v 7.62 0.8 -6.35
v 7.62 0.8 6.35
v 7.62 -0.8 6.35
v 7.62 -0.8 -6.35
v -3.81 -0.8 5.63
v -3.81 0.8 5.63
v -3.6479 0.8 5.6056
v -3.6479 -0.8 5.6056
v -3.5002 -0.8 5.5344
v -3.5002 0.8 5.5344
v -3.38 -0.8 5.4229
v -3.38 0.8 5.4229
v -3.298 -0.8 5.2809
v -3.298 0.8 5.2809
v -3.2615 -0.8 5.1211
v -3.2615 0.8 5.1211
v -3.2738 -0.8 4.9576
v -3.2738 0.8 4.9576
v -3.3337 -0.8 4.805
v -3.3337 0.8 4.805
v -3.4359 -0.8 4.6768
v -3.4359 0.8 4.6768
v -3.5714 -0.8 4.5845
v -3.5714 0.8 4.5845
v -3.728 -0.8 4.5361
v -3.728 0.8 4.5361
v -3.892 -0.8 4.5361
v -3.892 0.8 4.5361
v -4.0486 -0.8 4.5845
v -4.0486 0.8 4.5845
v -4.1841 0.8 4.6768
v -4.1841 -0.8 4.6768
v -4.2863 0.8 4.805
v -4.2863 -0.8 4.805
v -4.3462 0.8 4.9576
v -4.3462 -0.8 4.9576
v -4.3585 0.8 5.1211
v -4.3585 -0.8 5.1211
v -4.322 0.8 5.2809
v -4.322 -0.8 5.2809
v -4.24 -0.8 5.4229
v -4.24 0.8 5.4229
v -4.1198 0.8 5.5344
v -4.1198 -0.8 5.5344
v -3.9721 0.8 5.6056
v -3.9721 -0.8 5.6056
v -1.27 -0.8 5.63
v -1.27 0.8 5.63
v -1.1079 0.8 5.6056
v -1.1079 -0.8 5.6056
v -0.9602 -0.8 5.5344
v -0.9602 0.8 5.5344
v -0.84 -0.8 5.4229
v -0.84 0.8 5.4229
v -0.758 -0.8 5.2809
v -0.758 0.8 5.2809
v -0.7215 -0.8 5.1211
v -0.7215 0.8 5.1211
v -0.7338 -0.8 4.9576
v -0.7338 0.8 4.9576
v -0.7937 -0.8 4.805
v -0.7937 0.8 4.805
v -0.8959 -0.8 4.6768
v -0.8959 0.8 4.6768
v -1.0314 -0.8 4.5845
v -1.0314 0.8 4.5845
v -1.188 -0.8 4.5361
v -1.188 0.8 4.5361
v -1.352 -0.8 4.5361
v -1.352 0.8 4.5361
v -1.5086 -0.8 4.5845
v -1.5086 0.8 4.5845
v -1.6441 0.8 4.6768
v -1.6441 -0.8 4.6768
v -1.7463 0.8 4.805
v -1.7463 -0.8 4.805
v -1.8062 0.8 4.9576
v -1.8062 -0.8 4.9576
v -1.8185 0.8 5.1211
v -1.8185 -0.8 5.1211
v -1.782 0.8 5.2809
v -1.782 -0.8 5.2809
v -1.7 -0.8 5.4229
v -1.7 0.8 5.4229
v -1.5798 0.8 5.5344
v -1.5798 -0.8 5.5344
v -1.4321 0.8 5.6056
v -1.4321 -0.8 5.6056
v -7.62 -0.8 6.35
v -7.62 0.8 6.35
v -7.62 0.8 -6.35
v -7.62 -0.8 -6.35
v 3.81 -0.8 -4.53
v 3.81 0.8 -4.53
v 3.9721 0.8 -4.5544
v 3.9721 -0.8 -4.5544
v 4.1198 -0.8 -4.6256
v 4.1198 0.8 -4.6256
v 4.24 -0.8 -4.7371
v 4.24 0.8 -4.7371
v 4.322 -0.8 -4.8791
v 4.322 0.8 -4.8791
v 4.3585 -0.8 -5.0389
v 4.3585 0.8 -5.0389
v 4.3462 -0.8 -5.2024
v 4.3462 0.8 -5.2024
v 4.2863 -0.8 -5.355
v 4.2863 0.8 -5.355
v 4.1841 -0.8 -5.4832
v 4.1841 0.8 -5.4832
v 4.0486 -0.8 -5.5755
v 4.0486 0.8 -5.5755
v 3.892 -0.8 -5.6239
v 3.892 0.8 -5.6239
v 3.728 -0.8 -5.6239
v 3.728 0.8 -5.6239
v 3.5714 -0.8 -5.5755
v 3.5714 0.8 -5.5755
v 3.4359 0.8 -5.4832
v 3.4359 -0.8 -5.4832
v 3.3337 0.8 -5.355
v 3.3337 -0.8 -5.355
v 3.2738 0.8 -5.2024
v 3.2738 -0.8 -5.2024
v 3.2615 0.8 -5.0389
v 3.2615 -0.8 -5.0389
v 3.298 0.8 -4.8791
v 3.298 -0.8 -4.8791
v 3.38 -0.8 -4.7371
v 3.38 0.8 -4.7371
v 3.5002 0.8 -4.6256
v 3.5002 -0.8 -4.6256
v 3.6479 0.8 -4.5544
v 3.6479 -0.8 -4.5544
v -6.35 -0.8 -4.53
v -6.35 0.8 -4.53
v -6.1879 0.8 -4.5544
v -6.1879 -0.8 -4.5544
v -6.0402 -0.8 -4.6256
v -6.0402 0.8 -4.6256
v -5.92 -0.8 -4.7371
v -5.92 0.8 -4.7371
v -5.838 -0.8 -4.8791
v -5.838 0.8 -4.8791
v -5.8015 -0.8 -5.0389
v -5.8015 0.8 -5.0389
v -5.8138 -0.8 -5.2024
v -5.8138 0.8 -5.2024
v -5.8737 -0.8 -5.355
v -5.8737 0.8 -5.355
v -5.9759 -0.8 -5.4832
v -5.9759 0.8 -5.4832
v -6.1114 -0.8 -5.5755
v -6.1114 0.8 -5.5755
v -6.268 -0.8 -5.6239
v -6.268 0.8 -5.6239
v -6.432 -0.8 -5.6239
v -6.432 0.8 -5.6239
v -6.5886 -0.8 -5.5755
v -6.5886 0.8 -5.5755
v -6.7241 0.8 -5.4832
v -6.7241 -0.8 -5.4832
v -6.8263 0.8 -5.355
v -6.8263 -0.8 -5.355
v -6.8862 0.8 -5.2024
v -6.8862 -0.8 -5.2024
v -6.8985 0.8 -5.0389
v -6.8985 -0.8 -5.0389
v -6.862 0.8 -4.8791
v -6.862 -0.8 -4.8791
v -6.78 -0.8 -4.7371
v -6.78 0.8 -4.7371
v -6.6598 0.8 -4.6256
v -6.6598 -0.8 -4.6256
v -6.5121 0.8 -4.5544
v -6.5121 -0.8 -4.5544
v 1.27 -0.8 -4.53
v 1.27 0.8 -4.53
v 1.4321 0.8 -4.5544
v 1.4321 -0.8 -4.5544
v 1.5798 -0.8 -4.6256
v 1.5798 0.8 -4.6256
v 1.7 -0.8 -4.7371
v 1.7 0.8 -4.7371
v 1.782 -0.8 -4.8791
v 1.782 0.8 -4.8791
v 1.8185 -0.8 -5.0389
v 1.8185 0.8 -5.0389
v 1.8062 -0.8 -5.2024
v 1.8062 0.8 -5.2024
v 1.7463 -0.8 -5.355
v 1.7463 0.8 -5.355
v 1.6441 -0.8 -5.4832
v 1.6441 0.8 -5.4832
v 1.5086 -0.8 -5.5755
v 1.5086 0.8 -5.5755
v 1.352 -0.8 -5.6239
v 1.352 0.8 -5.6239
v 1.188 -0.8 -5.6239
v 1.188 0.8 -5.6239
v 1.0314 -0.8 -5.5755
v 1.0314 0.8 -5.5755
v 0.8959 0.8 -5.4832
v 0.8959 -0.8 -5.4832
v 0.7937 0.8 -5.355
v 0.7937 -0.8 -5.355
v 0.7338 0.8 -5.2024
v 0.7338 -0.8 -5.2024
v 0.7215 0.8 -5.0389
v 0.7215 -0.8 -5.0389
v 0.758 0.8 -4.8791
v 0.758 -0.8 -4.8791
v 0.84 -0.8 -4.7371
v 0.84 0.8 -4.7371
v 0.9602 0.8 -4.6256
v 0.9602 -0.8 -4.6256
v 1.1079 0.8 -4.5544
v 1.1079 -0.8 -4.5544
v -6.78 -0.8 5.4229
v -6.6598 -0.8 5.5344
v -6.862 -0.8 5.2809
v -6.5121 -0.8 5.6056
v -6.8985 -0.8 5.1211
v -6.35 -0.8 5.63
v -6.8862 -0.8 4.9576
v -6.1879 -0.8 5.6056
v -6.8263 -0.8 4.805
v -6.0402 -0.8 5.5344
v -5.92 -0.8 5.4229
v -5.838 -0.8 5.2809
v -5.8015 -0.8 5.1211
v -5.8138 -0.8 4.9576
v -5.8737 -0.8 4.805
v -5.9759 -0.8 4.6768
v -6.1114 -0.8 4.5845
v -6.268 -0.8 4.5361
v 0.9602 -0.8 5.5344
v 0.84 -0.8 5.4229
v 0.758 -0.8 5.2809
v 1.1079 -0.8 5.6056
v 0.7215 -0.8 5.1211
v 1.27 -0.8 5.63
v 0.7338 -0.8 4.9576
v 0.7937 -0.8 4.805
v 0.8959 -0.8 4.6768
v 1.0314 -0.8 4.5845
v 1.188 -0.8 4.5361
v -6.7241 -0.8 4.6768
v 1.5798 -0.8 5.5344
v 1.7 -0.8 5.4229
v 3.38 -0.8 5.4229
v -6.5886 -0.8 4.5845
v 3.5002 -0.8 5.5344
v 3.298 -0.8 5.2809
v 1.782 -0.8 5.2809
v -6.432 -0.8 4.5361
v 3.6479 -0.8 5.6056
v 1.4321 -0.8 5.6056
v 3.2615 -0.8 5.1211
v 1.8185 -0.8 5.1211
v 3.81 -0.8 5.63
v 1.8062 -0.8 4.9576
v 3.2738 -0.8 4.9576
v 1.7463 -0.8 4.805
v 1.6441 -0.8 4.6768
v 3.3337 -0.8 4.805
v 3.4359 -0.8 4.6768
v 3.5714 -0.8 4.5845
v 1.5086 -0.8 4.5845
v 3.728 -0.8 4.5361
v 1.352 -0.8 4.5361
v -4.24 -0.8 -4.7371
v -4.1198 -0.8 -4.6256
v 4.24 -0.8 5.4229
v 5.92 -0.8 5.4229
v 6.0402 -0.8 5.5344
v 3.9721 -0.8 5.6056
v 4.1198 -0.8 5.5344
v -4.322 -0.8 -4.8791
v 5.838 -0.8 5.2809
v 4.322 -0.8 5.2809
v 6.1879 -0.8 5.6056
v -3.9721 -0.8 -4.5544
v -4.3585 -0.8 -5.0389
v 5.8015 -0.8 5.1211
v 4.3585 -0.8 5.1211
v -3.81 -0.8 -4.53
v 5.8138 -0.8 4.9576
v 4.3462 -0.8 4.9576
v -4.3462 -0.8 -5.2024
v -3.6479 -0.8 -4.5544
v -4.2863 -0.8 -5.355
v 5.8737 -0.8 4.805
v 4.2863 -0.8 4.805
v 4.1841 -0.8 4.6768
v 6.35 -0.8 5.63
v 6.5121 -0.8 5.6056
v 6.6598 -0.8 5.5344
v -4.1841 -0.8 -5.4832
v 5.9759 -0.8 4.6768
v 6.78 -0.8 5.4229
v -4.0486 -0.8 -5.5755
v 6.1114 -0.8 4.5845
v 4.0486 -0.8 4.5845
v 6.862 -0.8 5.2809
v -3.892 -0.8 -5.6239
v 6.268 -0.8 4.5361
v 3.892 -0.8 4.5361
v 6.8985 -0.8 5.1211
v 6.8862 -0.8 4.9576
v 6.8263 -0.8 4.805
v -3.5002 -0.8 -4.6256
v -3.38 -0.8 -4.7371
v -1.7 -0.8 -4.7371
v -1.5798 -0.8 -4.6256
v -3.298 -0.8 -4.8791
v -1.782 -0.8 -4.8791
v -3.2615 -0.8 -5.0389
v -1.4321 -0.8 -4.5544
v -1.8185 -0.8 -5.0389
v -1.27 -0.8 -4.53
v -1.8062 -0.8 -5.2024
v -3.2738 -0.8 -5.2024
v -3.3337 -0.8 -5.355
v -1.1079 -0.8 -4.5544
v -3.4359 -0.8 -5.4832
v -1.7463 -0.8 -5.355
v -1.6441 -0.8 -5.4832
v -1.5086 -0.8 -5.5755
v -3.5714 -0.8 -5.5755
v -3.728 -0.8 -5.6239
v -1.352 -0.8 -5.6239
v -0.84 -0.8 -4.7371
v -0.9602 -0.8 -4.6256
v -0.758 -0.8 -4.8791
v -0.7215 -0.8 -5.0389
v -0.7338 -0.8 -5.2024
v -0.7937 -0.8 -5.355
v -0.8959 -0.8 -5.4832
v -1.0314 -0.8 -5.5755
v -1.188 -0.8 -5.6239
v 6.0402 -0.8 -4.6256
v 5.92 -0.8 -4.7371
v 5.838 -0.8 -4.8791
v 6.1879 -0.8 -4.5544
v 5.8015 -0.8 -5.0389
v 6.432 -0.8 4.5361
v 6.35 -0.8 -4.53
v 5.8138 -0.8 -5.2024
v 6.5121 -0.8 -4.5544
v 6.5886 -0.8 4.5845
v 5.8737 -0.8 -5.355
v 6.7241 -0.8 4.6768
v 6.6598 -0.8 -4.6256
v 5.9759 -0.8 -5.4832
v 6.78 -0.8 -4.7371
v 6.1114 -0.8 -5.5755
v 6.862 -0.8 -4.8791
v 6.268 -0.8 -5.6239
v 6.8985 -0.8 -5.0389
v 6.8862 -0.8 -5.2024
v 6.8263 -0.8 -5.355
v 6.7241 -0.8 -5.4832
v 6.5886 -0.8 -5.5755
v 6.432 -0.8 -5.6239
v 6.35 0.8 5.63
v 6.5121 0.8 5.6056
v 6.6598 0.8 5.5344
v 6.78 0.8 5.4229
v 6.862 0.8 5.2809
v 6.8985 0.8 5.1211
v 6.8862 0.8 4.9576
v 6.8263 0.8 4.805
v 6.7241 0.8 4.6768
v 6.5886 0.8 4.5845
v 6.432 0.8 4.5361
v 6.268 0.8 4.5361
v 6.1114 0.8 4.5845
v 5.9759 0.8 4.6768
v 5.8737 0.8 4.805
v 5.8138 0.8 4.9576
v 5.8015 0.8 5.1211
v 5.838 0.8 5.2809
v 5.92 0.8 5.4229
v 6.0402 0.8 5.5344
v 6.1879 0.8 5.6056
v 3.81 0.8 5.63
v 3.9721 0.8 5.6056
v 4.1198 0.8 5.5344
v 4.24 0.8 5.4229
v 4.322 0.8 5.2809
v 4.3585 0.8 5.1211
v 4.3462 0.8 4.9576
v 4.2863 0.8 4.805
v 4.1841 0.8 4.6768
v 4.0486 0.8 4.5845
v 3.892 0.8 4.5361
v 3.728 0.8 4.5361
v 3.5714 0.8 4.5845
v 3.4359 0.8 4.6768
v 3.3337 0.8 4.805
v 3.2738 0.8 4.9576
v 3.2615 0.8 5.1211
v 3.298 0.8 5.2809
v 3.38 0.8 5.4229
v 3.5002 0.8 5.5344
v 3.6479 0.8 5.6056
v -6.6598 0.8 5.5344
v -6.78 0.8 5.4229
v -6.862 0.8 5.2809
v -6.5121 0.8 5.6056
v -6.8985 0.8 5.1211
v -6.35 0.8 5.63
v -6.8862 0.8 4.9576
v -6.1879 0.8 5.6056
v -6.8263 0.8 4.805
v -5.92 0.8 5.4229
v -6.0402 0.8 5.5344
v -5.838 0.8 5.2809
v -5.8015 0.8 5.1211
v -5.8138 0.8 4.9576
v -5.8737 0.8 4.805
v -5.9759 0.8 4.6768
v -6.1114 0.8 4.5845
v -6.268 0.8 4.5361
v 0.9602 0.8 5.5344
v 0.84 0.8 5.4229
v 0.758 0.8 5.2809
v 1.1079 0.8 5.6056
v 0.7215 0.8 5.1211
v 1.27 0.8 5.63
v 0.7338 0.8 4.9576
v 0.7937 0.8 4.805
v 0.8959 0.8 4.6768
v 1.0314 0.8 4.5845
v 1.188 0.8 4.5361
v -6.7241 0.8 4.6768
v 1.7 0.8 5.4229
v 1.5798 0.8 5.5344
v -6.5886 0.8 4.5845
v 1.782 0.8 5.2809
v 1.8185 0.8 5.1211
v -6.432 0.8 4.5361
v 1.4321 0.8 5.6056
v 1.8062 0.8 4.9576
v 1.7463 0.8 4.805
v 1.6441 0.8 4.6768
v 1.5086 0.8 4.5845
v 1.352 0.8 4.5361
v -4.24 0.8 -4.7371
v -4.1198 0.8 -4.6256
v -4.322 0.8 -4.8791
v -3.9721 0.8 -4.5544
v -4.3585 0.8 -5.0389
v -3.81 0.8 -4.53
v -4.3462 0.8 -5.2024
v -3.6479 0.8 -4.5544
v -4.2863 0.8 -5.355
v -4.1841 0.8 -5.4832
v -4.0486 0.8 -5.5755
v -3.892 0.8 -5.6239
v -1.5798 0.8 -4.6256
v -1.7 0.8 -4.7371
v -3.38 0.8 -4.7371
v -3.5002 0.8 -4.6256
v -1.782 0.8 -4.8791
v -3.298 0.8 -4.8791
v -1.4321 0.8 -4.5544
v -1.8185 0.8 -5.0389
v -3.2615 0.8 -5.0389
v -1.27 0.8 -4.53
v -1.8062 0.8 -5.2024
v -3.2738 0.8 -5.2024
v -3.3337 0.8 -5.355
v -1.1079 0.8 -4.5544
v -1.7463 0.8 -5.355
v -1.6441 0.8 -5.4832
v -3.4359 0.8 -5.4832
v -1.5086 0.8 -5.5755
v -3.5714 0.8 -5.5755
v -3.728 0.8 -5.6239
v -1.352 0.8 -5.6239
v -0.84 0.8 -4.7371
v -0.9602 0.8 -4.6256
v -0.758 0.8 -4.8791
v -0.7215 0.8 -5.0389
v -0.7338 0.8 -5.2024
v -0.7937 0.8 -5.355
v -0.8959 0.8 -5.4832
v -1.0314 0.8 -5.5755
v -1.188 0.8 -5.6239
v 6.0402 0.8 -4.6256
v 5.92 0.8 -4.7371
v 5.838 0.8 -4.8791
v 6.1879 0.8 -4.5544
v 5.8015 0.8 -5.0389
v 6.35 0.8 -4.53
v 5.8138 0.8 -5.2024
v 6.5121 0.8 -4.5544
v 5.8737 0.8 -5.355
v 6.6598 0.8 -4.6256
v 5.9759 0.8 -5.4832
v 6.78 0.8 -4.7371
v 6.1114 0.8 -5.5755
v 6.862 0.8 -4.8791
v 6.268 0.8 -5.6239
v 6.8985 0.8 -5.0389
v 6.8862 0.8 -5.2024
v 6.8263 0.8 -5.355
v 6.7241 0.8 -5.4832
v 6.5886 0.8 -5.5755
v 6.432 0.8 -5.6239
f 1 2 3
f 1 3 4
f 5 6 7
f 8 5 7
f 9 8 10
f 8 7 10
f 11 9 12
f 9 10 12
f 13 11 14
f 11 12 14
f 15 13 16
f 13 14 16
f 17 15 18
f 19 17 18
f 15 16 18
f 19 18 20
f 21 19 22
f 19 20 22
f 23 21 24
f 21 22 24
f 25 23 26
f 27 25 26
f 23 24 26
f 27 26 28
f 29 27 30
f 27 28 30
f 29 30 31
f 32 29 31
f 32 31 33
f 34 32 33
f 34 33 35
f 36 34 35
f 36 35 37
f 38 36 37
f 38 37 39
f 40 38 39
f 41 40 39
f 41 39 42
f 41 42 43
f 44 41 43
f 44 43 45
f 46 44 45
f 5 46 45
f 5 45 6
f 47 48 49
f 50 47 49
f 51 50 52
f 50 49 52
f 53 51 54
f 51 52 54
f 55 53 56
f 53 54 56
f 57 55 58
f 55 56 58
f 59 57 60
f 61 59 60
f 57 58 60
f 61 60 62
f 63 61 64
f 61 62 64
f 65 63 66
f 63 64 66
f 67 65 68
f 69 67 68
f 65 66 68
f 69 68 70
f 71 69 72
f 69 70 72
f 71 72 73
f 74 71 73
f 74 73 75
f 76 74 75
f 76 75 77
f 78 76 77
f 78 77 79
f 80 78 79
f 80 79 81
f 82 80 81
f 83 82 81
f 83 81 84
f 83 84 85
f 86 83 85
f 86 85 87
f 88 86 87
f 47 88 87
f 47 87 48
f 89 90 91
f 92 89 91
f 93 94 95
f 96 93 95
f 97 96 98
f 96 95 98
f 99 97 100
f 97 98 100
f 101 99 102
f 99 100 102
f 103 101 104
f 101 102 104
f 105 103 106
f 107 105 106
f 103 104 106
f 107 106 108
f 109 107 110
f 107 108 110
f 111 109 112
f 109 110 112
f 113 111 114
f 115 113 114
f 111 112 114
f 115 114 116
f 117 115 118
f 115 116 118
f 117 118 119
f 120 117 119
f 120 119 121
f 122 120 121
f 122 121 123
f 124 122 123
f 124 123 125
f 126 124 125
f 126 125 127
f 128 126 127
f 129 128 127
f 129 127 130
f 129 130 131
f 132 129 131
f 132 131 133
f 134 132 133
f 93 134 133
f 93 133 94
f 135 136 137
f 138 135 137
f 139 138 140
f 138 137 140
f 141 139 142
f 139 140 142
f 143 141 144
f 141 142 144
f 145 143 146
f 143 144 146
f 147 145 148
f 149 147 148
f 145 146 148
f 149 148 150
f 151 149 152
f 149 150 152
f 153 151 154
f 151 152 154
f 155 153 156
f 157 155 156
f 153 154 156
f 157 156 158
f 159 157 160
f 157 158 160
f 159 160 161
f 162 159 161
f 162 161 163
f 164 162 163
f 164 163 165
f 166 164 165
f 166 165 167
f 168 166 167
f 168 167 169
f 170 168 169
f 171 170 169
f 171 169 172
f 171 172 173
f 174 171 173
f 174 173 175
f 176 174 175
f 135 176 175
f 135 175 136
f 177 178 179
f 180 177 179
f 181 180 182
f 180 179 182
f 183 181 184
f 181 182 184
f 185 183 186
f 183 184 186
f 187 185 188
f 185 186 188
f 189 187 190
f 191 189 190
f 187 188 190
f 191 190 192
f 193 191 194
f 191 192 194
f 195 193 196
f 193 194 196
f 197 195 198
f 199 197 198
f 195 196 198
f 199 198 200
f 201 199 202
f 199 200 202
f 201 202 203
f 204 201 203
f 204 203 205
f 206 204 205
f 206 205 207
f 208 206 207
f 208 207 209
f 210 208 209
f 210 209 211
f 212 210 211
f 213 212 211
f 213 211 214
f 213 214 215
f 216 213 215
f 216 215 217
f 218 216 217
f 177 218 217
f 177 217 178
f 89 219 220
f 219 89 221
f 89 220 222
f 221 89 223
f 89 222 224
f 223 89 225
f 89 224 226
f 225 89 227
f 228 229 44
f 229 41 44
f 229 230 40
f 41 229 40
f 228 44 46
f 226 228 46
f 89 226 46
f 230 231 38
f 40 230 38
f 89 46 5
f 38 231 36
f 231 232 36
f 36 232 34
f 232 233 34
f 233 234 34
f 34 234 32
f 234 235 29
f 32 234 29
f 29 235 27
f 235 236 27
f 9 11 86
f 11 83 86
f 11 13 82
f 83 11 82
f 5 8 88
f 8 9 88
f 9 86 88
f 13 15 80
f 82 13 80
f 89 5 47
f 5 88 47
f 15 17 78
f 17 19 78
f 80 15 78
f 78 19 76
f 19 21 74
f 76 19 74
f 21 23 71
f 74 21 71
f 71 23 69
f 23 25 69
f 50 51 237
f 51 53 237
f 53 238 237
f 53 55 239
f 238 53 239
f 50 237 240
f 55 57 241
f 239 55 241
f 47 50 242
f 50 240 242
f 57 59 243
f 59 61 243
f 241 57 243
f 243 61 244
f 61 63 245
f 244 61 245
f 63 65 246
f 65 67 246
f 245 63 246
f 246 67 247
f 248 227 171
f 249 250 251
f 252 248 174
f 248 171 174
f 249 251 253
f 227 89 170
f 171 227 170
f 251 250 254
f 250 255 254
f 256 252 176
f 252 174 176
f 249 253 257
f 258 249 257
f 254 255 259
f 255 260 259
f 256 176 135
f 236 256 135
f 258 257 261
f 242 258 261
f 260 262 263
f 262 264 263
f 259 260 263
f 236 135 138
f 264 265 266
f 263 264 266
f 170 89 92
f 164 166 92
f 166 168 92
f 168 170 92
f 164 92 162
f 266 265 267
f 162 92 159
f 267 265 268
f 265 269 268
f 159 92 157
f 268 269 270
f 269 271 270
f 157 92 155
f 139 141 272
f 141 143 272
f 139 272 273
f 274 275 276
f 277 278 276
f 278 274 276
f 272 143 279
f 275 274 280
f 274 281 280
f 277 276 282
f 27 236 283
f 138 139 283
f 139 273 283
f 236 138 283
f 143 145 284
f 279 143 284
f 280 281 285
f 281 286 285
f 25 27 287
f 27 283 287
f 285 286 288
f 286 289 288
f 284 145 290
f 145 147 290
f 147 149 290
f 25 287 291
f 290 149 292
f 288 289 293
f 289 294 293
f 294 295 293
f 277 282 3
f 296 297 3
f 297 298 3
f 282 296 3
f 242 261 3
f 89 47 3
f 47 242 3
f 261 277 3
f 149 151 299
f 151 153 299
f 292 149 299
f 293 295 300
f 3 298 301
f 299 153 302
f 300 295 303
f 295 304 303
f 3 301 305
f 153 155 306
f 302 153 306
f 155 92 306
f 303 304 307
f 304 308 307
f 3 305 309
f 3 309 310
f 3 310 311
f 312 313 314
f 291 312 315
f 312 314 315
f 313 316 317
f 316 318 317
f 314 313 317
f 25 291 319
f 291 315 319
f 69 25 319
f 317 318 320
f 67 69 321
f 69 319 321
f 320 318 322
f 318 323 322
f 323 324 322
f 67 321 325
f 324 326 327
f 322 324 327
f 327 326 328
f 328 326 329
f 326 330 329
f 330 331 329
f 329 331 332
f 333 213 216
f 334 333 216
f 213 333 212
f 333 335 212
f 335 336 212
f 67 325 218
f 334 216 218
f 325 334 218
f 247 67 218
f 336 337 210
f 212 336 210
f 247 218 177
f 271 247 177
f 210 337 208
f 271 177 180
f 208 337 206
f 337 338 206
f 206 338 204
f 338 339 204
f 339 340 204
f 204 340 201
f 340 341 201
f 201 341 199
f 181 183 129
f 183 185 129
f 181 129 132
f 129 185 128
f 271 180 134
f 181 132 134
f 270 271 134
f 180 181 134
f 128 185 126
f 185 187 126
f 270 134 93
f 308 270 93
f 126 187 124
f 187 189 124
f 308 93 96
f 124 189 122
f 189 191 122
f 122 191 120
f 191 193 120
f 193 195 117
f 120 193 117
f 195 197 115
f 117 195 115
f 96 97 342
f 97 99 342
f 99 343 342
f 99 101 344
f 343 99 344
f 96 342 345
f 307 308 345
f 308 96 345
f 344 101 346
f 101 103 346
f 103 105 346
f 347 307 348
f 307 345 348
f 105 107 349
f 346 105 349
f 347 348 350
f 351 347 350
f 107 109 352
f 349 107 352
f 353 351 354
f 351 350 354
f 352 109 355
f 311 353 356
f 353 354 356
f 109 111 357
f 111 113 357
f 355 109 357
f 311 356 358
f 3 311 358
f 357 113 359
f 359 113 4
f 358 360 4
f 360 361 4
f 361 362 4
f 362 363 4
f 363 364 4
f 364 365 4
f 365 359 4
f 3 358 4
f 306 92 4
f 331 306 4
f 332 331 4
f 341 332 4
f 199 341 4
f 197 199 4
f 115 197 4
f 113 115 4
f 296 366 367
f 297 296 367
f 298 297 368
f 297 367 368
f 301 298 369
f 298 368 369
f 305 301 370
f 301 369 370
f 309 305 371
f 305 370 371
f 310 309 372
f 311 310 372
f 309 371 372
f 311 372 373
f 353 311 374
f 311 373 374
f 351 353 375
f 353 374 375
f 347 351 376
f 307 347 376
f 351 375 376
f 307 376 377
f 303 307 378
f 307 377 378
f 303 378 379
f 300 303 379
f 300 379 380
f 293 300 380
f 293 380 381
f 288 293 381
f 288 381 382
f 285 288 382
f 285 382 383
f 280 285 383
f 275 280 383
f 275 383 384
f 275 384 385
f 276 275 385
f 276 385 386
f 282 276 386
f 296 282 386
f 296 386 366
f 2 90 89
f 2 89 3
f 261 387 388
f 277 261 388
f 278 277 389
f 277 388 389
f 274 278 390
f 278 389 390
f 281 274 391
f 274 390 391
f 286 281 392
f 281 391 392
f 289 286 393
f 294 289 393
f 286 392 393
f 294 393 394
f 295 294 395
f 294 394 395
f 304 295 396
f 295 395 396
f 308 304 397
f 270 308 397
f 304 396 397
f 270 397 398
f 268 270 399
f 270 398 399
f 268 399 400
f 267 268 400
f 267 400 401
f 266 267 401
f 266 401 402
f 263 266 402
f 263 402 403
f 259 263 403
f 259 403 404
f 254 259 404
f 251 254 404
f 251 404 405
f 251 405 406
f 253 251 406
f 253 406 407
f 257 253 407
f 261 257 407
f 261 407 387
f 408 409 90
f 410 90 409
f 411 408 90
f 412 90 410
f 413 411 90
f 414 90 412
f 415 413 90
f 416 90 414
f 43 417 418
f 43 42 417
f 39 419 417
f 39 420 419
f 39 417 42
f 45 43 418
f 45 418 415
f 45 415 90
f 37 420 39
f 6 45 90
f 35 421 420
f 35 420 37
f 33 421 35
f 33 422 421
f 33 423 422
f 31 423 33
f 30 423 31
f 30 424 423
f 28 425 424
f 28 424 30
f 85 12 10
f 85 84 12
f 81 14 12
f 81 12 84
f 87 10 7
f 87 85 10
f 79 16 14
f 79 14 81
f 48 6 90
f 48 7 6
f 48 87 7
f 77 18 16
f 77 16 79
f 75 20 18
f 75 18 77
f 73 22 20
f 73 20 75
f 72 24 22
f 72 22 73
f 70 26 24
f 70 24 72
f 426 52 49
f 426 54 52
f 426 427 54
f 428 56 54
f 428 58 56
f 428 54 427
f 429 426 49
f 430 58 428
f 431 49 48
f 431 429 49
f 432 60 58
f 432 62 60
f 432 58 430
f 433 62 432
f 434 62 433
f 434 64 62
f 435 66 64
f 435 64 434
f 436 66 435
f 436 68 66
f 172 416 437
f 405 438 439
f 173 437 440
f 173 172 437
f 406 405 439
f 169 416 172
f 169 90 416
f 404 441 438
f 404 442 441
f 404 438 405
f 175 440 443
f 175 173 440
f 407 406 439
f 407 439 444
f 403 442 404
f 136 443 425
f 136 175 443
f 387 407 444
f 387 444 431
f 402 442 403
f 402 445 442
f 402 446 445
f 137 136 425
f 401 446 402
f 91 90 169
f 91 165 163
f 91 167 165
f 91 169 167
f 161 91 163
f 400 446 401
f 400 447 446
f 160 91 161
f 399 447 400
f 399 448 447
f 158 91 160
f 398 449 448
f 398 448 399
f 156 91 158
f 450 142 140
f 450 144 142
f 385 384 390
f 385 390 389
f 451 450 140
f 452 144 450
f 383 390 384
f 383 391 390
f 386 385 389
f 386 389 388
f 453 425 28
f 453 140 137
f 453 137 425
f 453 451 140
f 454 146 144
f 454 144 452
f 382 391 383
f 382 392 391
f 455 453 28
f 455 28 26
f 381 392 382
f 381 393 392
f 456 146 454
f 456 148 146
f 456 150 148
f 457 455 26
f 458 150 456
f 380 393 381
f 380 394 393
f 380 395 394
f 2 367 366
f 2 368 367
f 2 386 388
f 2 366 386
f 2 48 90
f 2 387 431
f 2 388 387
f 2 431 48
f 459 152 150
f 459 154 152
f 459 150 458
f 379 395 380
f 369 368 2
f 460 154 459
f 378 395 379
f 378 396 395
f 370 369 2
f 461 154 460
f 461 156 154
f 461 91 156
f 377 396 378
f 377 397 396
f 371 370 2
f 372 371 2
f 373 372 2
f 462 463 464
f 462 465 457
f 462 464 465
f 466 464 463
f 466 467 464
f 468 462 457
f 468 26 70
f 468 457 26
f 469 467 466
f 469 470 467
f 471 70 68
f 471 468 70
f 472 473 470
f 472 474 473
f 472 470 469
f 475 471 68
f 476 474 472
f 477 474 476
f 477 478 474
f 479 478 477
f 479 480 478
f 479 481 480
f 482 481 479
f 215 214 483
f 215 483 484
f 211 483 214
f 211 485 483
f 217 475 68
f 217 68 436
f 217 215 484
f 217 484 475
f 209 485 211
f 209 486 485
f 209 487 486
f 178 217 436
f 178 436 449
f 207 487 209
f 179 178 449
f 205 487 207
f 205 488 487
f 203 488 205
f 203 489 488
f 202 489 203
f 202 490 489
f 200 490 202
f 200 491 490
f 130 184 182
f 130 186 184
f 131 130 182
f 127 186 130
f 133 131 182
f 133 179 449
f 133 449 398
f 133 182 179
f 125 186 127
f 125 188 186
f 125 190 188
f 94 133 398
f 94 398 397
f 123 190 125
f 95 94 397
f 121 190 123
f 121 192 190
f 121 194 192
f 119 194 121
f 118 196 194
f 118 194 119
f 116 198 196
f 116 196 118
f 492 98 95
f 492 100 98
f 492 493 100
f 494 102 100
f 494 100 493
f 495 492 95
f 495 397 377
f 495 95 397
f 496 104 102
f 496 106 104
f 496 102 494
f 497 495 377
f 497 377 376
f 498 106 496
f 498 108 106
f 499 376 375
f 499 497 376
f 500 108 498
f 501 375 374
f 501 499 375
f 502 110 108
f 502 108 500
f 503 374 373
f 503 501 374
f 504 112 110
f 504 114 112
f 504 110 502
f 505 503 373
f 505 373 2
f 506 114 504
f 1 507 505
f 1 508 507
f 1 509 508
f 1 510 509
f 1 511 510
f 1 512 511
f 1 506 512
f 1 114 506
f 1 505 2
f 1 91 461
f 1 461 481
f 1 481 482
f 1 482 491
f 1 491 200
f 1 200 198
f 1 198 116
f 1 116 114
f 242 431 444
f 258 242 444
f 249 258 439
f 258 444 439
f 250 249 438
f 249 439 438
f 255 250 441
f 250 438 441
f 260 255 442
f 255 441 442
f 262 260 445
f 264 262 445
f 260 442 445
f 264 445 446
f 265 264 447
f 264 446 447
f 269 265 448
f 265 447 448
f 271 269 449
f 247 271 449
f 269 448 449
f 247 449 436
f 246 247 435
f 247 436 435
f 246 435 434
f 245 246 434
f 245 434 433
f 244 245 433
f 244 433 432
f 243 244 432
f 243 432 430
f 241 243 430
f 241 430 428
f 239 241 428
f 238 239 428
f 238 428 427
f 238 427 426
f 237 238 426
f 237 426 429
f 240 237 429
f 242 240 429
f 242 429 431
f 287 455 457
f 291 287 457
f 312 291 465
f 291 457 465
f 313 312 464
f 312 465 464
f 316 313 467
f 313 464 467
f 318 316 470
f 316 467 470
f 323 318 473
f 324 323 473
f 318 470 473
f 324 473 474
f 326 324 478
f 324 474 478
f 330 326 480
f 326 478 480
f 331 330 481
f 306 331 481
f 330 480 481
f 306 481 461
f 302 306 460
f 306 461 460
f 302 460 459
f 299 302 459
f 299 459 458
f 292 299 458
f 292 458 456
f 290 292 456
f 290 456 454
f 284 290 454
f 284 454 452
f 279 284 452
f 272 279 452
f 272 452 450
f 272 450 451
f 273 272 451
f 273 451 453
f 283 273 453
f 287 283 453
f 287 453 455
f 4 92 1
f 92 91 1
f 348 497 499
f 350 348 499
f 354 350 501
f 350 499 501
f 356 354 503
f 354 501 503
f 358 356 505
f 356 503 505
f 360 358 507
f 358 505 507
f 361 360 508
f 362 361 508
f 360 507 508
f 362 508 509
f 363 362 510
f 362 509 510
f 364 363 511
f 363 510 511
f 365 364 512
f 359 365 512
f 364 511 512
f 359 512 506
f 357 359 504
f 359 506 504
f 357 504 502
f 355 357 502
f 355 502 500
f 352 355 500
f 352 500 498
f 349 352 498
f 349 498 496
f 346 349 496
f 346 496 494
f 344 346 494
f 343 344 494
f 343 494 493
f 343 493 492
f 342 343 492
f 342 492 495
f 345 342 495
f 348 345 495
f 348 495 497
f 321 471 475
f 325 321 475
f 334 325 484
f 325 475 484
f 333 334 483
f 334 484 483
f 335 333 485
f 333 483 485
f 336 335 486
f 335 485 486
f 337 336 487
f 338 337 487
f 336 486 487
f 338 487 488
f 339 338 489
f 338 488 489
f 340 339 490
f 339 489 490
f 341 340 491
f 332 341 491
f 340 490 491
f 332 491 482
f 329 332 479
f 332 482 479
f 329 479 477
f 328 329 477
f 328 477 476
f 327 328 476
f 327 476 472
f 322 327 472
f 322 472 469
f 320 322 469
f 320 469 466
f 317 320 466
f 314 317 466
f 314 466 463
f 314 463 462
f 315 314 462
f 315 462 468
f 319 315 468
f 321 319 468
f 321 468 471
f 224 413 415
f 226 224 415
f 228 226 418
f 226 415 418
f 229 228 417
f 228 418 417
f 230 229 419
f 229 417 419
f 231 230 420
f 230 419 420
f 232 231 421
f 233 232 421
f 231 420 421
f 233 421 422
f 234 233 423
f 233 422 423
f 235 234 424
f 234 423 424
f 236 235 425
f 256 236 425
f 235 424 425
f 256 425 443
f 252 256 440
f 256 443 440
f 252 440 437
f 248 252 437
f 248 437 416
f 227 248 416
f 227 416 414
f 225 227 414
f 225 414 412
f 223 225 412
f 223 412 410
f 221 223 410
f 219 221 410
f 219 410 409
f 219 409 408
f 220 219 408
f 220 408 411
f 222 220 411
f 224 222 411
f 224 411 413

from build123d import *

# Parameters (mm, degrees)
SKETCH1_W            = 15.24
SKETCH1_H            = 12.7
BOSS_EXTRUDE1_DEPTH  = 0.8
SKETCH2_R            = 0.55
CUT_EXTRUDE1_DEPTH   = 11.04723345
LPATTERN1_COUNT      = 6
LPATTERN1_PITCH      = 2.54
LPATTERN1_COUNT_DIR2 = 2
LPATTERN1_PITCH_DIR2 = 10.16


with BuildPart() as part:
    # Sketch1 → Boss-Extrude1 (new, symmetric)
    with BuildSketch(Plane(origin=(0, 0, 0), x_dir=(1, 0, 0), z_dir=(0, 1, 0))):
        Rectangle(SKETCH1_W, SKETCH1_H)
    extrude(amount=BOSS_EXTRUDE1_DEPTH, both=True)

    # Sketch2 → Cut-Extrude1 (cut, through all)
    with BuildSketch(Plane(origin=(0, 0.8, 0), x_dir=(1, 0, 0), z_dir=(0, 1, 0))):
        with Locations(Location((-6.35, -5.08, 0), (0, 0, 270))):
            Circle(SKETCH2_R)
    cut_extrude1 = extrude(amount=-CUT_EXTRUDE1_DEPTH, mode=Mode.SUBTRACT)

    # LPattern1: Cut-Extrude1 6 × 2
    with Locations(*[(i * LPATTERN1_PITCH, 0, -j * LPATTERN1_PITCH_DIR2) for i in range(LPATTERN1_COUNT) for j in range(LPATTERN1_COUNT_DIR2) if (i, j) != (0, 0)]):
        add(cut_extrude1, mode=Mode.SUBTRACT)


solid = part.part
